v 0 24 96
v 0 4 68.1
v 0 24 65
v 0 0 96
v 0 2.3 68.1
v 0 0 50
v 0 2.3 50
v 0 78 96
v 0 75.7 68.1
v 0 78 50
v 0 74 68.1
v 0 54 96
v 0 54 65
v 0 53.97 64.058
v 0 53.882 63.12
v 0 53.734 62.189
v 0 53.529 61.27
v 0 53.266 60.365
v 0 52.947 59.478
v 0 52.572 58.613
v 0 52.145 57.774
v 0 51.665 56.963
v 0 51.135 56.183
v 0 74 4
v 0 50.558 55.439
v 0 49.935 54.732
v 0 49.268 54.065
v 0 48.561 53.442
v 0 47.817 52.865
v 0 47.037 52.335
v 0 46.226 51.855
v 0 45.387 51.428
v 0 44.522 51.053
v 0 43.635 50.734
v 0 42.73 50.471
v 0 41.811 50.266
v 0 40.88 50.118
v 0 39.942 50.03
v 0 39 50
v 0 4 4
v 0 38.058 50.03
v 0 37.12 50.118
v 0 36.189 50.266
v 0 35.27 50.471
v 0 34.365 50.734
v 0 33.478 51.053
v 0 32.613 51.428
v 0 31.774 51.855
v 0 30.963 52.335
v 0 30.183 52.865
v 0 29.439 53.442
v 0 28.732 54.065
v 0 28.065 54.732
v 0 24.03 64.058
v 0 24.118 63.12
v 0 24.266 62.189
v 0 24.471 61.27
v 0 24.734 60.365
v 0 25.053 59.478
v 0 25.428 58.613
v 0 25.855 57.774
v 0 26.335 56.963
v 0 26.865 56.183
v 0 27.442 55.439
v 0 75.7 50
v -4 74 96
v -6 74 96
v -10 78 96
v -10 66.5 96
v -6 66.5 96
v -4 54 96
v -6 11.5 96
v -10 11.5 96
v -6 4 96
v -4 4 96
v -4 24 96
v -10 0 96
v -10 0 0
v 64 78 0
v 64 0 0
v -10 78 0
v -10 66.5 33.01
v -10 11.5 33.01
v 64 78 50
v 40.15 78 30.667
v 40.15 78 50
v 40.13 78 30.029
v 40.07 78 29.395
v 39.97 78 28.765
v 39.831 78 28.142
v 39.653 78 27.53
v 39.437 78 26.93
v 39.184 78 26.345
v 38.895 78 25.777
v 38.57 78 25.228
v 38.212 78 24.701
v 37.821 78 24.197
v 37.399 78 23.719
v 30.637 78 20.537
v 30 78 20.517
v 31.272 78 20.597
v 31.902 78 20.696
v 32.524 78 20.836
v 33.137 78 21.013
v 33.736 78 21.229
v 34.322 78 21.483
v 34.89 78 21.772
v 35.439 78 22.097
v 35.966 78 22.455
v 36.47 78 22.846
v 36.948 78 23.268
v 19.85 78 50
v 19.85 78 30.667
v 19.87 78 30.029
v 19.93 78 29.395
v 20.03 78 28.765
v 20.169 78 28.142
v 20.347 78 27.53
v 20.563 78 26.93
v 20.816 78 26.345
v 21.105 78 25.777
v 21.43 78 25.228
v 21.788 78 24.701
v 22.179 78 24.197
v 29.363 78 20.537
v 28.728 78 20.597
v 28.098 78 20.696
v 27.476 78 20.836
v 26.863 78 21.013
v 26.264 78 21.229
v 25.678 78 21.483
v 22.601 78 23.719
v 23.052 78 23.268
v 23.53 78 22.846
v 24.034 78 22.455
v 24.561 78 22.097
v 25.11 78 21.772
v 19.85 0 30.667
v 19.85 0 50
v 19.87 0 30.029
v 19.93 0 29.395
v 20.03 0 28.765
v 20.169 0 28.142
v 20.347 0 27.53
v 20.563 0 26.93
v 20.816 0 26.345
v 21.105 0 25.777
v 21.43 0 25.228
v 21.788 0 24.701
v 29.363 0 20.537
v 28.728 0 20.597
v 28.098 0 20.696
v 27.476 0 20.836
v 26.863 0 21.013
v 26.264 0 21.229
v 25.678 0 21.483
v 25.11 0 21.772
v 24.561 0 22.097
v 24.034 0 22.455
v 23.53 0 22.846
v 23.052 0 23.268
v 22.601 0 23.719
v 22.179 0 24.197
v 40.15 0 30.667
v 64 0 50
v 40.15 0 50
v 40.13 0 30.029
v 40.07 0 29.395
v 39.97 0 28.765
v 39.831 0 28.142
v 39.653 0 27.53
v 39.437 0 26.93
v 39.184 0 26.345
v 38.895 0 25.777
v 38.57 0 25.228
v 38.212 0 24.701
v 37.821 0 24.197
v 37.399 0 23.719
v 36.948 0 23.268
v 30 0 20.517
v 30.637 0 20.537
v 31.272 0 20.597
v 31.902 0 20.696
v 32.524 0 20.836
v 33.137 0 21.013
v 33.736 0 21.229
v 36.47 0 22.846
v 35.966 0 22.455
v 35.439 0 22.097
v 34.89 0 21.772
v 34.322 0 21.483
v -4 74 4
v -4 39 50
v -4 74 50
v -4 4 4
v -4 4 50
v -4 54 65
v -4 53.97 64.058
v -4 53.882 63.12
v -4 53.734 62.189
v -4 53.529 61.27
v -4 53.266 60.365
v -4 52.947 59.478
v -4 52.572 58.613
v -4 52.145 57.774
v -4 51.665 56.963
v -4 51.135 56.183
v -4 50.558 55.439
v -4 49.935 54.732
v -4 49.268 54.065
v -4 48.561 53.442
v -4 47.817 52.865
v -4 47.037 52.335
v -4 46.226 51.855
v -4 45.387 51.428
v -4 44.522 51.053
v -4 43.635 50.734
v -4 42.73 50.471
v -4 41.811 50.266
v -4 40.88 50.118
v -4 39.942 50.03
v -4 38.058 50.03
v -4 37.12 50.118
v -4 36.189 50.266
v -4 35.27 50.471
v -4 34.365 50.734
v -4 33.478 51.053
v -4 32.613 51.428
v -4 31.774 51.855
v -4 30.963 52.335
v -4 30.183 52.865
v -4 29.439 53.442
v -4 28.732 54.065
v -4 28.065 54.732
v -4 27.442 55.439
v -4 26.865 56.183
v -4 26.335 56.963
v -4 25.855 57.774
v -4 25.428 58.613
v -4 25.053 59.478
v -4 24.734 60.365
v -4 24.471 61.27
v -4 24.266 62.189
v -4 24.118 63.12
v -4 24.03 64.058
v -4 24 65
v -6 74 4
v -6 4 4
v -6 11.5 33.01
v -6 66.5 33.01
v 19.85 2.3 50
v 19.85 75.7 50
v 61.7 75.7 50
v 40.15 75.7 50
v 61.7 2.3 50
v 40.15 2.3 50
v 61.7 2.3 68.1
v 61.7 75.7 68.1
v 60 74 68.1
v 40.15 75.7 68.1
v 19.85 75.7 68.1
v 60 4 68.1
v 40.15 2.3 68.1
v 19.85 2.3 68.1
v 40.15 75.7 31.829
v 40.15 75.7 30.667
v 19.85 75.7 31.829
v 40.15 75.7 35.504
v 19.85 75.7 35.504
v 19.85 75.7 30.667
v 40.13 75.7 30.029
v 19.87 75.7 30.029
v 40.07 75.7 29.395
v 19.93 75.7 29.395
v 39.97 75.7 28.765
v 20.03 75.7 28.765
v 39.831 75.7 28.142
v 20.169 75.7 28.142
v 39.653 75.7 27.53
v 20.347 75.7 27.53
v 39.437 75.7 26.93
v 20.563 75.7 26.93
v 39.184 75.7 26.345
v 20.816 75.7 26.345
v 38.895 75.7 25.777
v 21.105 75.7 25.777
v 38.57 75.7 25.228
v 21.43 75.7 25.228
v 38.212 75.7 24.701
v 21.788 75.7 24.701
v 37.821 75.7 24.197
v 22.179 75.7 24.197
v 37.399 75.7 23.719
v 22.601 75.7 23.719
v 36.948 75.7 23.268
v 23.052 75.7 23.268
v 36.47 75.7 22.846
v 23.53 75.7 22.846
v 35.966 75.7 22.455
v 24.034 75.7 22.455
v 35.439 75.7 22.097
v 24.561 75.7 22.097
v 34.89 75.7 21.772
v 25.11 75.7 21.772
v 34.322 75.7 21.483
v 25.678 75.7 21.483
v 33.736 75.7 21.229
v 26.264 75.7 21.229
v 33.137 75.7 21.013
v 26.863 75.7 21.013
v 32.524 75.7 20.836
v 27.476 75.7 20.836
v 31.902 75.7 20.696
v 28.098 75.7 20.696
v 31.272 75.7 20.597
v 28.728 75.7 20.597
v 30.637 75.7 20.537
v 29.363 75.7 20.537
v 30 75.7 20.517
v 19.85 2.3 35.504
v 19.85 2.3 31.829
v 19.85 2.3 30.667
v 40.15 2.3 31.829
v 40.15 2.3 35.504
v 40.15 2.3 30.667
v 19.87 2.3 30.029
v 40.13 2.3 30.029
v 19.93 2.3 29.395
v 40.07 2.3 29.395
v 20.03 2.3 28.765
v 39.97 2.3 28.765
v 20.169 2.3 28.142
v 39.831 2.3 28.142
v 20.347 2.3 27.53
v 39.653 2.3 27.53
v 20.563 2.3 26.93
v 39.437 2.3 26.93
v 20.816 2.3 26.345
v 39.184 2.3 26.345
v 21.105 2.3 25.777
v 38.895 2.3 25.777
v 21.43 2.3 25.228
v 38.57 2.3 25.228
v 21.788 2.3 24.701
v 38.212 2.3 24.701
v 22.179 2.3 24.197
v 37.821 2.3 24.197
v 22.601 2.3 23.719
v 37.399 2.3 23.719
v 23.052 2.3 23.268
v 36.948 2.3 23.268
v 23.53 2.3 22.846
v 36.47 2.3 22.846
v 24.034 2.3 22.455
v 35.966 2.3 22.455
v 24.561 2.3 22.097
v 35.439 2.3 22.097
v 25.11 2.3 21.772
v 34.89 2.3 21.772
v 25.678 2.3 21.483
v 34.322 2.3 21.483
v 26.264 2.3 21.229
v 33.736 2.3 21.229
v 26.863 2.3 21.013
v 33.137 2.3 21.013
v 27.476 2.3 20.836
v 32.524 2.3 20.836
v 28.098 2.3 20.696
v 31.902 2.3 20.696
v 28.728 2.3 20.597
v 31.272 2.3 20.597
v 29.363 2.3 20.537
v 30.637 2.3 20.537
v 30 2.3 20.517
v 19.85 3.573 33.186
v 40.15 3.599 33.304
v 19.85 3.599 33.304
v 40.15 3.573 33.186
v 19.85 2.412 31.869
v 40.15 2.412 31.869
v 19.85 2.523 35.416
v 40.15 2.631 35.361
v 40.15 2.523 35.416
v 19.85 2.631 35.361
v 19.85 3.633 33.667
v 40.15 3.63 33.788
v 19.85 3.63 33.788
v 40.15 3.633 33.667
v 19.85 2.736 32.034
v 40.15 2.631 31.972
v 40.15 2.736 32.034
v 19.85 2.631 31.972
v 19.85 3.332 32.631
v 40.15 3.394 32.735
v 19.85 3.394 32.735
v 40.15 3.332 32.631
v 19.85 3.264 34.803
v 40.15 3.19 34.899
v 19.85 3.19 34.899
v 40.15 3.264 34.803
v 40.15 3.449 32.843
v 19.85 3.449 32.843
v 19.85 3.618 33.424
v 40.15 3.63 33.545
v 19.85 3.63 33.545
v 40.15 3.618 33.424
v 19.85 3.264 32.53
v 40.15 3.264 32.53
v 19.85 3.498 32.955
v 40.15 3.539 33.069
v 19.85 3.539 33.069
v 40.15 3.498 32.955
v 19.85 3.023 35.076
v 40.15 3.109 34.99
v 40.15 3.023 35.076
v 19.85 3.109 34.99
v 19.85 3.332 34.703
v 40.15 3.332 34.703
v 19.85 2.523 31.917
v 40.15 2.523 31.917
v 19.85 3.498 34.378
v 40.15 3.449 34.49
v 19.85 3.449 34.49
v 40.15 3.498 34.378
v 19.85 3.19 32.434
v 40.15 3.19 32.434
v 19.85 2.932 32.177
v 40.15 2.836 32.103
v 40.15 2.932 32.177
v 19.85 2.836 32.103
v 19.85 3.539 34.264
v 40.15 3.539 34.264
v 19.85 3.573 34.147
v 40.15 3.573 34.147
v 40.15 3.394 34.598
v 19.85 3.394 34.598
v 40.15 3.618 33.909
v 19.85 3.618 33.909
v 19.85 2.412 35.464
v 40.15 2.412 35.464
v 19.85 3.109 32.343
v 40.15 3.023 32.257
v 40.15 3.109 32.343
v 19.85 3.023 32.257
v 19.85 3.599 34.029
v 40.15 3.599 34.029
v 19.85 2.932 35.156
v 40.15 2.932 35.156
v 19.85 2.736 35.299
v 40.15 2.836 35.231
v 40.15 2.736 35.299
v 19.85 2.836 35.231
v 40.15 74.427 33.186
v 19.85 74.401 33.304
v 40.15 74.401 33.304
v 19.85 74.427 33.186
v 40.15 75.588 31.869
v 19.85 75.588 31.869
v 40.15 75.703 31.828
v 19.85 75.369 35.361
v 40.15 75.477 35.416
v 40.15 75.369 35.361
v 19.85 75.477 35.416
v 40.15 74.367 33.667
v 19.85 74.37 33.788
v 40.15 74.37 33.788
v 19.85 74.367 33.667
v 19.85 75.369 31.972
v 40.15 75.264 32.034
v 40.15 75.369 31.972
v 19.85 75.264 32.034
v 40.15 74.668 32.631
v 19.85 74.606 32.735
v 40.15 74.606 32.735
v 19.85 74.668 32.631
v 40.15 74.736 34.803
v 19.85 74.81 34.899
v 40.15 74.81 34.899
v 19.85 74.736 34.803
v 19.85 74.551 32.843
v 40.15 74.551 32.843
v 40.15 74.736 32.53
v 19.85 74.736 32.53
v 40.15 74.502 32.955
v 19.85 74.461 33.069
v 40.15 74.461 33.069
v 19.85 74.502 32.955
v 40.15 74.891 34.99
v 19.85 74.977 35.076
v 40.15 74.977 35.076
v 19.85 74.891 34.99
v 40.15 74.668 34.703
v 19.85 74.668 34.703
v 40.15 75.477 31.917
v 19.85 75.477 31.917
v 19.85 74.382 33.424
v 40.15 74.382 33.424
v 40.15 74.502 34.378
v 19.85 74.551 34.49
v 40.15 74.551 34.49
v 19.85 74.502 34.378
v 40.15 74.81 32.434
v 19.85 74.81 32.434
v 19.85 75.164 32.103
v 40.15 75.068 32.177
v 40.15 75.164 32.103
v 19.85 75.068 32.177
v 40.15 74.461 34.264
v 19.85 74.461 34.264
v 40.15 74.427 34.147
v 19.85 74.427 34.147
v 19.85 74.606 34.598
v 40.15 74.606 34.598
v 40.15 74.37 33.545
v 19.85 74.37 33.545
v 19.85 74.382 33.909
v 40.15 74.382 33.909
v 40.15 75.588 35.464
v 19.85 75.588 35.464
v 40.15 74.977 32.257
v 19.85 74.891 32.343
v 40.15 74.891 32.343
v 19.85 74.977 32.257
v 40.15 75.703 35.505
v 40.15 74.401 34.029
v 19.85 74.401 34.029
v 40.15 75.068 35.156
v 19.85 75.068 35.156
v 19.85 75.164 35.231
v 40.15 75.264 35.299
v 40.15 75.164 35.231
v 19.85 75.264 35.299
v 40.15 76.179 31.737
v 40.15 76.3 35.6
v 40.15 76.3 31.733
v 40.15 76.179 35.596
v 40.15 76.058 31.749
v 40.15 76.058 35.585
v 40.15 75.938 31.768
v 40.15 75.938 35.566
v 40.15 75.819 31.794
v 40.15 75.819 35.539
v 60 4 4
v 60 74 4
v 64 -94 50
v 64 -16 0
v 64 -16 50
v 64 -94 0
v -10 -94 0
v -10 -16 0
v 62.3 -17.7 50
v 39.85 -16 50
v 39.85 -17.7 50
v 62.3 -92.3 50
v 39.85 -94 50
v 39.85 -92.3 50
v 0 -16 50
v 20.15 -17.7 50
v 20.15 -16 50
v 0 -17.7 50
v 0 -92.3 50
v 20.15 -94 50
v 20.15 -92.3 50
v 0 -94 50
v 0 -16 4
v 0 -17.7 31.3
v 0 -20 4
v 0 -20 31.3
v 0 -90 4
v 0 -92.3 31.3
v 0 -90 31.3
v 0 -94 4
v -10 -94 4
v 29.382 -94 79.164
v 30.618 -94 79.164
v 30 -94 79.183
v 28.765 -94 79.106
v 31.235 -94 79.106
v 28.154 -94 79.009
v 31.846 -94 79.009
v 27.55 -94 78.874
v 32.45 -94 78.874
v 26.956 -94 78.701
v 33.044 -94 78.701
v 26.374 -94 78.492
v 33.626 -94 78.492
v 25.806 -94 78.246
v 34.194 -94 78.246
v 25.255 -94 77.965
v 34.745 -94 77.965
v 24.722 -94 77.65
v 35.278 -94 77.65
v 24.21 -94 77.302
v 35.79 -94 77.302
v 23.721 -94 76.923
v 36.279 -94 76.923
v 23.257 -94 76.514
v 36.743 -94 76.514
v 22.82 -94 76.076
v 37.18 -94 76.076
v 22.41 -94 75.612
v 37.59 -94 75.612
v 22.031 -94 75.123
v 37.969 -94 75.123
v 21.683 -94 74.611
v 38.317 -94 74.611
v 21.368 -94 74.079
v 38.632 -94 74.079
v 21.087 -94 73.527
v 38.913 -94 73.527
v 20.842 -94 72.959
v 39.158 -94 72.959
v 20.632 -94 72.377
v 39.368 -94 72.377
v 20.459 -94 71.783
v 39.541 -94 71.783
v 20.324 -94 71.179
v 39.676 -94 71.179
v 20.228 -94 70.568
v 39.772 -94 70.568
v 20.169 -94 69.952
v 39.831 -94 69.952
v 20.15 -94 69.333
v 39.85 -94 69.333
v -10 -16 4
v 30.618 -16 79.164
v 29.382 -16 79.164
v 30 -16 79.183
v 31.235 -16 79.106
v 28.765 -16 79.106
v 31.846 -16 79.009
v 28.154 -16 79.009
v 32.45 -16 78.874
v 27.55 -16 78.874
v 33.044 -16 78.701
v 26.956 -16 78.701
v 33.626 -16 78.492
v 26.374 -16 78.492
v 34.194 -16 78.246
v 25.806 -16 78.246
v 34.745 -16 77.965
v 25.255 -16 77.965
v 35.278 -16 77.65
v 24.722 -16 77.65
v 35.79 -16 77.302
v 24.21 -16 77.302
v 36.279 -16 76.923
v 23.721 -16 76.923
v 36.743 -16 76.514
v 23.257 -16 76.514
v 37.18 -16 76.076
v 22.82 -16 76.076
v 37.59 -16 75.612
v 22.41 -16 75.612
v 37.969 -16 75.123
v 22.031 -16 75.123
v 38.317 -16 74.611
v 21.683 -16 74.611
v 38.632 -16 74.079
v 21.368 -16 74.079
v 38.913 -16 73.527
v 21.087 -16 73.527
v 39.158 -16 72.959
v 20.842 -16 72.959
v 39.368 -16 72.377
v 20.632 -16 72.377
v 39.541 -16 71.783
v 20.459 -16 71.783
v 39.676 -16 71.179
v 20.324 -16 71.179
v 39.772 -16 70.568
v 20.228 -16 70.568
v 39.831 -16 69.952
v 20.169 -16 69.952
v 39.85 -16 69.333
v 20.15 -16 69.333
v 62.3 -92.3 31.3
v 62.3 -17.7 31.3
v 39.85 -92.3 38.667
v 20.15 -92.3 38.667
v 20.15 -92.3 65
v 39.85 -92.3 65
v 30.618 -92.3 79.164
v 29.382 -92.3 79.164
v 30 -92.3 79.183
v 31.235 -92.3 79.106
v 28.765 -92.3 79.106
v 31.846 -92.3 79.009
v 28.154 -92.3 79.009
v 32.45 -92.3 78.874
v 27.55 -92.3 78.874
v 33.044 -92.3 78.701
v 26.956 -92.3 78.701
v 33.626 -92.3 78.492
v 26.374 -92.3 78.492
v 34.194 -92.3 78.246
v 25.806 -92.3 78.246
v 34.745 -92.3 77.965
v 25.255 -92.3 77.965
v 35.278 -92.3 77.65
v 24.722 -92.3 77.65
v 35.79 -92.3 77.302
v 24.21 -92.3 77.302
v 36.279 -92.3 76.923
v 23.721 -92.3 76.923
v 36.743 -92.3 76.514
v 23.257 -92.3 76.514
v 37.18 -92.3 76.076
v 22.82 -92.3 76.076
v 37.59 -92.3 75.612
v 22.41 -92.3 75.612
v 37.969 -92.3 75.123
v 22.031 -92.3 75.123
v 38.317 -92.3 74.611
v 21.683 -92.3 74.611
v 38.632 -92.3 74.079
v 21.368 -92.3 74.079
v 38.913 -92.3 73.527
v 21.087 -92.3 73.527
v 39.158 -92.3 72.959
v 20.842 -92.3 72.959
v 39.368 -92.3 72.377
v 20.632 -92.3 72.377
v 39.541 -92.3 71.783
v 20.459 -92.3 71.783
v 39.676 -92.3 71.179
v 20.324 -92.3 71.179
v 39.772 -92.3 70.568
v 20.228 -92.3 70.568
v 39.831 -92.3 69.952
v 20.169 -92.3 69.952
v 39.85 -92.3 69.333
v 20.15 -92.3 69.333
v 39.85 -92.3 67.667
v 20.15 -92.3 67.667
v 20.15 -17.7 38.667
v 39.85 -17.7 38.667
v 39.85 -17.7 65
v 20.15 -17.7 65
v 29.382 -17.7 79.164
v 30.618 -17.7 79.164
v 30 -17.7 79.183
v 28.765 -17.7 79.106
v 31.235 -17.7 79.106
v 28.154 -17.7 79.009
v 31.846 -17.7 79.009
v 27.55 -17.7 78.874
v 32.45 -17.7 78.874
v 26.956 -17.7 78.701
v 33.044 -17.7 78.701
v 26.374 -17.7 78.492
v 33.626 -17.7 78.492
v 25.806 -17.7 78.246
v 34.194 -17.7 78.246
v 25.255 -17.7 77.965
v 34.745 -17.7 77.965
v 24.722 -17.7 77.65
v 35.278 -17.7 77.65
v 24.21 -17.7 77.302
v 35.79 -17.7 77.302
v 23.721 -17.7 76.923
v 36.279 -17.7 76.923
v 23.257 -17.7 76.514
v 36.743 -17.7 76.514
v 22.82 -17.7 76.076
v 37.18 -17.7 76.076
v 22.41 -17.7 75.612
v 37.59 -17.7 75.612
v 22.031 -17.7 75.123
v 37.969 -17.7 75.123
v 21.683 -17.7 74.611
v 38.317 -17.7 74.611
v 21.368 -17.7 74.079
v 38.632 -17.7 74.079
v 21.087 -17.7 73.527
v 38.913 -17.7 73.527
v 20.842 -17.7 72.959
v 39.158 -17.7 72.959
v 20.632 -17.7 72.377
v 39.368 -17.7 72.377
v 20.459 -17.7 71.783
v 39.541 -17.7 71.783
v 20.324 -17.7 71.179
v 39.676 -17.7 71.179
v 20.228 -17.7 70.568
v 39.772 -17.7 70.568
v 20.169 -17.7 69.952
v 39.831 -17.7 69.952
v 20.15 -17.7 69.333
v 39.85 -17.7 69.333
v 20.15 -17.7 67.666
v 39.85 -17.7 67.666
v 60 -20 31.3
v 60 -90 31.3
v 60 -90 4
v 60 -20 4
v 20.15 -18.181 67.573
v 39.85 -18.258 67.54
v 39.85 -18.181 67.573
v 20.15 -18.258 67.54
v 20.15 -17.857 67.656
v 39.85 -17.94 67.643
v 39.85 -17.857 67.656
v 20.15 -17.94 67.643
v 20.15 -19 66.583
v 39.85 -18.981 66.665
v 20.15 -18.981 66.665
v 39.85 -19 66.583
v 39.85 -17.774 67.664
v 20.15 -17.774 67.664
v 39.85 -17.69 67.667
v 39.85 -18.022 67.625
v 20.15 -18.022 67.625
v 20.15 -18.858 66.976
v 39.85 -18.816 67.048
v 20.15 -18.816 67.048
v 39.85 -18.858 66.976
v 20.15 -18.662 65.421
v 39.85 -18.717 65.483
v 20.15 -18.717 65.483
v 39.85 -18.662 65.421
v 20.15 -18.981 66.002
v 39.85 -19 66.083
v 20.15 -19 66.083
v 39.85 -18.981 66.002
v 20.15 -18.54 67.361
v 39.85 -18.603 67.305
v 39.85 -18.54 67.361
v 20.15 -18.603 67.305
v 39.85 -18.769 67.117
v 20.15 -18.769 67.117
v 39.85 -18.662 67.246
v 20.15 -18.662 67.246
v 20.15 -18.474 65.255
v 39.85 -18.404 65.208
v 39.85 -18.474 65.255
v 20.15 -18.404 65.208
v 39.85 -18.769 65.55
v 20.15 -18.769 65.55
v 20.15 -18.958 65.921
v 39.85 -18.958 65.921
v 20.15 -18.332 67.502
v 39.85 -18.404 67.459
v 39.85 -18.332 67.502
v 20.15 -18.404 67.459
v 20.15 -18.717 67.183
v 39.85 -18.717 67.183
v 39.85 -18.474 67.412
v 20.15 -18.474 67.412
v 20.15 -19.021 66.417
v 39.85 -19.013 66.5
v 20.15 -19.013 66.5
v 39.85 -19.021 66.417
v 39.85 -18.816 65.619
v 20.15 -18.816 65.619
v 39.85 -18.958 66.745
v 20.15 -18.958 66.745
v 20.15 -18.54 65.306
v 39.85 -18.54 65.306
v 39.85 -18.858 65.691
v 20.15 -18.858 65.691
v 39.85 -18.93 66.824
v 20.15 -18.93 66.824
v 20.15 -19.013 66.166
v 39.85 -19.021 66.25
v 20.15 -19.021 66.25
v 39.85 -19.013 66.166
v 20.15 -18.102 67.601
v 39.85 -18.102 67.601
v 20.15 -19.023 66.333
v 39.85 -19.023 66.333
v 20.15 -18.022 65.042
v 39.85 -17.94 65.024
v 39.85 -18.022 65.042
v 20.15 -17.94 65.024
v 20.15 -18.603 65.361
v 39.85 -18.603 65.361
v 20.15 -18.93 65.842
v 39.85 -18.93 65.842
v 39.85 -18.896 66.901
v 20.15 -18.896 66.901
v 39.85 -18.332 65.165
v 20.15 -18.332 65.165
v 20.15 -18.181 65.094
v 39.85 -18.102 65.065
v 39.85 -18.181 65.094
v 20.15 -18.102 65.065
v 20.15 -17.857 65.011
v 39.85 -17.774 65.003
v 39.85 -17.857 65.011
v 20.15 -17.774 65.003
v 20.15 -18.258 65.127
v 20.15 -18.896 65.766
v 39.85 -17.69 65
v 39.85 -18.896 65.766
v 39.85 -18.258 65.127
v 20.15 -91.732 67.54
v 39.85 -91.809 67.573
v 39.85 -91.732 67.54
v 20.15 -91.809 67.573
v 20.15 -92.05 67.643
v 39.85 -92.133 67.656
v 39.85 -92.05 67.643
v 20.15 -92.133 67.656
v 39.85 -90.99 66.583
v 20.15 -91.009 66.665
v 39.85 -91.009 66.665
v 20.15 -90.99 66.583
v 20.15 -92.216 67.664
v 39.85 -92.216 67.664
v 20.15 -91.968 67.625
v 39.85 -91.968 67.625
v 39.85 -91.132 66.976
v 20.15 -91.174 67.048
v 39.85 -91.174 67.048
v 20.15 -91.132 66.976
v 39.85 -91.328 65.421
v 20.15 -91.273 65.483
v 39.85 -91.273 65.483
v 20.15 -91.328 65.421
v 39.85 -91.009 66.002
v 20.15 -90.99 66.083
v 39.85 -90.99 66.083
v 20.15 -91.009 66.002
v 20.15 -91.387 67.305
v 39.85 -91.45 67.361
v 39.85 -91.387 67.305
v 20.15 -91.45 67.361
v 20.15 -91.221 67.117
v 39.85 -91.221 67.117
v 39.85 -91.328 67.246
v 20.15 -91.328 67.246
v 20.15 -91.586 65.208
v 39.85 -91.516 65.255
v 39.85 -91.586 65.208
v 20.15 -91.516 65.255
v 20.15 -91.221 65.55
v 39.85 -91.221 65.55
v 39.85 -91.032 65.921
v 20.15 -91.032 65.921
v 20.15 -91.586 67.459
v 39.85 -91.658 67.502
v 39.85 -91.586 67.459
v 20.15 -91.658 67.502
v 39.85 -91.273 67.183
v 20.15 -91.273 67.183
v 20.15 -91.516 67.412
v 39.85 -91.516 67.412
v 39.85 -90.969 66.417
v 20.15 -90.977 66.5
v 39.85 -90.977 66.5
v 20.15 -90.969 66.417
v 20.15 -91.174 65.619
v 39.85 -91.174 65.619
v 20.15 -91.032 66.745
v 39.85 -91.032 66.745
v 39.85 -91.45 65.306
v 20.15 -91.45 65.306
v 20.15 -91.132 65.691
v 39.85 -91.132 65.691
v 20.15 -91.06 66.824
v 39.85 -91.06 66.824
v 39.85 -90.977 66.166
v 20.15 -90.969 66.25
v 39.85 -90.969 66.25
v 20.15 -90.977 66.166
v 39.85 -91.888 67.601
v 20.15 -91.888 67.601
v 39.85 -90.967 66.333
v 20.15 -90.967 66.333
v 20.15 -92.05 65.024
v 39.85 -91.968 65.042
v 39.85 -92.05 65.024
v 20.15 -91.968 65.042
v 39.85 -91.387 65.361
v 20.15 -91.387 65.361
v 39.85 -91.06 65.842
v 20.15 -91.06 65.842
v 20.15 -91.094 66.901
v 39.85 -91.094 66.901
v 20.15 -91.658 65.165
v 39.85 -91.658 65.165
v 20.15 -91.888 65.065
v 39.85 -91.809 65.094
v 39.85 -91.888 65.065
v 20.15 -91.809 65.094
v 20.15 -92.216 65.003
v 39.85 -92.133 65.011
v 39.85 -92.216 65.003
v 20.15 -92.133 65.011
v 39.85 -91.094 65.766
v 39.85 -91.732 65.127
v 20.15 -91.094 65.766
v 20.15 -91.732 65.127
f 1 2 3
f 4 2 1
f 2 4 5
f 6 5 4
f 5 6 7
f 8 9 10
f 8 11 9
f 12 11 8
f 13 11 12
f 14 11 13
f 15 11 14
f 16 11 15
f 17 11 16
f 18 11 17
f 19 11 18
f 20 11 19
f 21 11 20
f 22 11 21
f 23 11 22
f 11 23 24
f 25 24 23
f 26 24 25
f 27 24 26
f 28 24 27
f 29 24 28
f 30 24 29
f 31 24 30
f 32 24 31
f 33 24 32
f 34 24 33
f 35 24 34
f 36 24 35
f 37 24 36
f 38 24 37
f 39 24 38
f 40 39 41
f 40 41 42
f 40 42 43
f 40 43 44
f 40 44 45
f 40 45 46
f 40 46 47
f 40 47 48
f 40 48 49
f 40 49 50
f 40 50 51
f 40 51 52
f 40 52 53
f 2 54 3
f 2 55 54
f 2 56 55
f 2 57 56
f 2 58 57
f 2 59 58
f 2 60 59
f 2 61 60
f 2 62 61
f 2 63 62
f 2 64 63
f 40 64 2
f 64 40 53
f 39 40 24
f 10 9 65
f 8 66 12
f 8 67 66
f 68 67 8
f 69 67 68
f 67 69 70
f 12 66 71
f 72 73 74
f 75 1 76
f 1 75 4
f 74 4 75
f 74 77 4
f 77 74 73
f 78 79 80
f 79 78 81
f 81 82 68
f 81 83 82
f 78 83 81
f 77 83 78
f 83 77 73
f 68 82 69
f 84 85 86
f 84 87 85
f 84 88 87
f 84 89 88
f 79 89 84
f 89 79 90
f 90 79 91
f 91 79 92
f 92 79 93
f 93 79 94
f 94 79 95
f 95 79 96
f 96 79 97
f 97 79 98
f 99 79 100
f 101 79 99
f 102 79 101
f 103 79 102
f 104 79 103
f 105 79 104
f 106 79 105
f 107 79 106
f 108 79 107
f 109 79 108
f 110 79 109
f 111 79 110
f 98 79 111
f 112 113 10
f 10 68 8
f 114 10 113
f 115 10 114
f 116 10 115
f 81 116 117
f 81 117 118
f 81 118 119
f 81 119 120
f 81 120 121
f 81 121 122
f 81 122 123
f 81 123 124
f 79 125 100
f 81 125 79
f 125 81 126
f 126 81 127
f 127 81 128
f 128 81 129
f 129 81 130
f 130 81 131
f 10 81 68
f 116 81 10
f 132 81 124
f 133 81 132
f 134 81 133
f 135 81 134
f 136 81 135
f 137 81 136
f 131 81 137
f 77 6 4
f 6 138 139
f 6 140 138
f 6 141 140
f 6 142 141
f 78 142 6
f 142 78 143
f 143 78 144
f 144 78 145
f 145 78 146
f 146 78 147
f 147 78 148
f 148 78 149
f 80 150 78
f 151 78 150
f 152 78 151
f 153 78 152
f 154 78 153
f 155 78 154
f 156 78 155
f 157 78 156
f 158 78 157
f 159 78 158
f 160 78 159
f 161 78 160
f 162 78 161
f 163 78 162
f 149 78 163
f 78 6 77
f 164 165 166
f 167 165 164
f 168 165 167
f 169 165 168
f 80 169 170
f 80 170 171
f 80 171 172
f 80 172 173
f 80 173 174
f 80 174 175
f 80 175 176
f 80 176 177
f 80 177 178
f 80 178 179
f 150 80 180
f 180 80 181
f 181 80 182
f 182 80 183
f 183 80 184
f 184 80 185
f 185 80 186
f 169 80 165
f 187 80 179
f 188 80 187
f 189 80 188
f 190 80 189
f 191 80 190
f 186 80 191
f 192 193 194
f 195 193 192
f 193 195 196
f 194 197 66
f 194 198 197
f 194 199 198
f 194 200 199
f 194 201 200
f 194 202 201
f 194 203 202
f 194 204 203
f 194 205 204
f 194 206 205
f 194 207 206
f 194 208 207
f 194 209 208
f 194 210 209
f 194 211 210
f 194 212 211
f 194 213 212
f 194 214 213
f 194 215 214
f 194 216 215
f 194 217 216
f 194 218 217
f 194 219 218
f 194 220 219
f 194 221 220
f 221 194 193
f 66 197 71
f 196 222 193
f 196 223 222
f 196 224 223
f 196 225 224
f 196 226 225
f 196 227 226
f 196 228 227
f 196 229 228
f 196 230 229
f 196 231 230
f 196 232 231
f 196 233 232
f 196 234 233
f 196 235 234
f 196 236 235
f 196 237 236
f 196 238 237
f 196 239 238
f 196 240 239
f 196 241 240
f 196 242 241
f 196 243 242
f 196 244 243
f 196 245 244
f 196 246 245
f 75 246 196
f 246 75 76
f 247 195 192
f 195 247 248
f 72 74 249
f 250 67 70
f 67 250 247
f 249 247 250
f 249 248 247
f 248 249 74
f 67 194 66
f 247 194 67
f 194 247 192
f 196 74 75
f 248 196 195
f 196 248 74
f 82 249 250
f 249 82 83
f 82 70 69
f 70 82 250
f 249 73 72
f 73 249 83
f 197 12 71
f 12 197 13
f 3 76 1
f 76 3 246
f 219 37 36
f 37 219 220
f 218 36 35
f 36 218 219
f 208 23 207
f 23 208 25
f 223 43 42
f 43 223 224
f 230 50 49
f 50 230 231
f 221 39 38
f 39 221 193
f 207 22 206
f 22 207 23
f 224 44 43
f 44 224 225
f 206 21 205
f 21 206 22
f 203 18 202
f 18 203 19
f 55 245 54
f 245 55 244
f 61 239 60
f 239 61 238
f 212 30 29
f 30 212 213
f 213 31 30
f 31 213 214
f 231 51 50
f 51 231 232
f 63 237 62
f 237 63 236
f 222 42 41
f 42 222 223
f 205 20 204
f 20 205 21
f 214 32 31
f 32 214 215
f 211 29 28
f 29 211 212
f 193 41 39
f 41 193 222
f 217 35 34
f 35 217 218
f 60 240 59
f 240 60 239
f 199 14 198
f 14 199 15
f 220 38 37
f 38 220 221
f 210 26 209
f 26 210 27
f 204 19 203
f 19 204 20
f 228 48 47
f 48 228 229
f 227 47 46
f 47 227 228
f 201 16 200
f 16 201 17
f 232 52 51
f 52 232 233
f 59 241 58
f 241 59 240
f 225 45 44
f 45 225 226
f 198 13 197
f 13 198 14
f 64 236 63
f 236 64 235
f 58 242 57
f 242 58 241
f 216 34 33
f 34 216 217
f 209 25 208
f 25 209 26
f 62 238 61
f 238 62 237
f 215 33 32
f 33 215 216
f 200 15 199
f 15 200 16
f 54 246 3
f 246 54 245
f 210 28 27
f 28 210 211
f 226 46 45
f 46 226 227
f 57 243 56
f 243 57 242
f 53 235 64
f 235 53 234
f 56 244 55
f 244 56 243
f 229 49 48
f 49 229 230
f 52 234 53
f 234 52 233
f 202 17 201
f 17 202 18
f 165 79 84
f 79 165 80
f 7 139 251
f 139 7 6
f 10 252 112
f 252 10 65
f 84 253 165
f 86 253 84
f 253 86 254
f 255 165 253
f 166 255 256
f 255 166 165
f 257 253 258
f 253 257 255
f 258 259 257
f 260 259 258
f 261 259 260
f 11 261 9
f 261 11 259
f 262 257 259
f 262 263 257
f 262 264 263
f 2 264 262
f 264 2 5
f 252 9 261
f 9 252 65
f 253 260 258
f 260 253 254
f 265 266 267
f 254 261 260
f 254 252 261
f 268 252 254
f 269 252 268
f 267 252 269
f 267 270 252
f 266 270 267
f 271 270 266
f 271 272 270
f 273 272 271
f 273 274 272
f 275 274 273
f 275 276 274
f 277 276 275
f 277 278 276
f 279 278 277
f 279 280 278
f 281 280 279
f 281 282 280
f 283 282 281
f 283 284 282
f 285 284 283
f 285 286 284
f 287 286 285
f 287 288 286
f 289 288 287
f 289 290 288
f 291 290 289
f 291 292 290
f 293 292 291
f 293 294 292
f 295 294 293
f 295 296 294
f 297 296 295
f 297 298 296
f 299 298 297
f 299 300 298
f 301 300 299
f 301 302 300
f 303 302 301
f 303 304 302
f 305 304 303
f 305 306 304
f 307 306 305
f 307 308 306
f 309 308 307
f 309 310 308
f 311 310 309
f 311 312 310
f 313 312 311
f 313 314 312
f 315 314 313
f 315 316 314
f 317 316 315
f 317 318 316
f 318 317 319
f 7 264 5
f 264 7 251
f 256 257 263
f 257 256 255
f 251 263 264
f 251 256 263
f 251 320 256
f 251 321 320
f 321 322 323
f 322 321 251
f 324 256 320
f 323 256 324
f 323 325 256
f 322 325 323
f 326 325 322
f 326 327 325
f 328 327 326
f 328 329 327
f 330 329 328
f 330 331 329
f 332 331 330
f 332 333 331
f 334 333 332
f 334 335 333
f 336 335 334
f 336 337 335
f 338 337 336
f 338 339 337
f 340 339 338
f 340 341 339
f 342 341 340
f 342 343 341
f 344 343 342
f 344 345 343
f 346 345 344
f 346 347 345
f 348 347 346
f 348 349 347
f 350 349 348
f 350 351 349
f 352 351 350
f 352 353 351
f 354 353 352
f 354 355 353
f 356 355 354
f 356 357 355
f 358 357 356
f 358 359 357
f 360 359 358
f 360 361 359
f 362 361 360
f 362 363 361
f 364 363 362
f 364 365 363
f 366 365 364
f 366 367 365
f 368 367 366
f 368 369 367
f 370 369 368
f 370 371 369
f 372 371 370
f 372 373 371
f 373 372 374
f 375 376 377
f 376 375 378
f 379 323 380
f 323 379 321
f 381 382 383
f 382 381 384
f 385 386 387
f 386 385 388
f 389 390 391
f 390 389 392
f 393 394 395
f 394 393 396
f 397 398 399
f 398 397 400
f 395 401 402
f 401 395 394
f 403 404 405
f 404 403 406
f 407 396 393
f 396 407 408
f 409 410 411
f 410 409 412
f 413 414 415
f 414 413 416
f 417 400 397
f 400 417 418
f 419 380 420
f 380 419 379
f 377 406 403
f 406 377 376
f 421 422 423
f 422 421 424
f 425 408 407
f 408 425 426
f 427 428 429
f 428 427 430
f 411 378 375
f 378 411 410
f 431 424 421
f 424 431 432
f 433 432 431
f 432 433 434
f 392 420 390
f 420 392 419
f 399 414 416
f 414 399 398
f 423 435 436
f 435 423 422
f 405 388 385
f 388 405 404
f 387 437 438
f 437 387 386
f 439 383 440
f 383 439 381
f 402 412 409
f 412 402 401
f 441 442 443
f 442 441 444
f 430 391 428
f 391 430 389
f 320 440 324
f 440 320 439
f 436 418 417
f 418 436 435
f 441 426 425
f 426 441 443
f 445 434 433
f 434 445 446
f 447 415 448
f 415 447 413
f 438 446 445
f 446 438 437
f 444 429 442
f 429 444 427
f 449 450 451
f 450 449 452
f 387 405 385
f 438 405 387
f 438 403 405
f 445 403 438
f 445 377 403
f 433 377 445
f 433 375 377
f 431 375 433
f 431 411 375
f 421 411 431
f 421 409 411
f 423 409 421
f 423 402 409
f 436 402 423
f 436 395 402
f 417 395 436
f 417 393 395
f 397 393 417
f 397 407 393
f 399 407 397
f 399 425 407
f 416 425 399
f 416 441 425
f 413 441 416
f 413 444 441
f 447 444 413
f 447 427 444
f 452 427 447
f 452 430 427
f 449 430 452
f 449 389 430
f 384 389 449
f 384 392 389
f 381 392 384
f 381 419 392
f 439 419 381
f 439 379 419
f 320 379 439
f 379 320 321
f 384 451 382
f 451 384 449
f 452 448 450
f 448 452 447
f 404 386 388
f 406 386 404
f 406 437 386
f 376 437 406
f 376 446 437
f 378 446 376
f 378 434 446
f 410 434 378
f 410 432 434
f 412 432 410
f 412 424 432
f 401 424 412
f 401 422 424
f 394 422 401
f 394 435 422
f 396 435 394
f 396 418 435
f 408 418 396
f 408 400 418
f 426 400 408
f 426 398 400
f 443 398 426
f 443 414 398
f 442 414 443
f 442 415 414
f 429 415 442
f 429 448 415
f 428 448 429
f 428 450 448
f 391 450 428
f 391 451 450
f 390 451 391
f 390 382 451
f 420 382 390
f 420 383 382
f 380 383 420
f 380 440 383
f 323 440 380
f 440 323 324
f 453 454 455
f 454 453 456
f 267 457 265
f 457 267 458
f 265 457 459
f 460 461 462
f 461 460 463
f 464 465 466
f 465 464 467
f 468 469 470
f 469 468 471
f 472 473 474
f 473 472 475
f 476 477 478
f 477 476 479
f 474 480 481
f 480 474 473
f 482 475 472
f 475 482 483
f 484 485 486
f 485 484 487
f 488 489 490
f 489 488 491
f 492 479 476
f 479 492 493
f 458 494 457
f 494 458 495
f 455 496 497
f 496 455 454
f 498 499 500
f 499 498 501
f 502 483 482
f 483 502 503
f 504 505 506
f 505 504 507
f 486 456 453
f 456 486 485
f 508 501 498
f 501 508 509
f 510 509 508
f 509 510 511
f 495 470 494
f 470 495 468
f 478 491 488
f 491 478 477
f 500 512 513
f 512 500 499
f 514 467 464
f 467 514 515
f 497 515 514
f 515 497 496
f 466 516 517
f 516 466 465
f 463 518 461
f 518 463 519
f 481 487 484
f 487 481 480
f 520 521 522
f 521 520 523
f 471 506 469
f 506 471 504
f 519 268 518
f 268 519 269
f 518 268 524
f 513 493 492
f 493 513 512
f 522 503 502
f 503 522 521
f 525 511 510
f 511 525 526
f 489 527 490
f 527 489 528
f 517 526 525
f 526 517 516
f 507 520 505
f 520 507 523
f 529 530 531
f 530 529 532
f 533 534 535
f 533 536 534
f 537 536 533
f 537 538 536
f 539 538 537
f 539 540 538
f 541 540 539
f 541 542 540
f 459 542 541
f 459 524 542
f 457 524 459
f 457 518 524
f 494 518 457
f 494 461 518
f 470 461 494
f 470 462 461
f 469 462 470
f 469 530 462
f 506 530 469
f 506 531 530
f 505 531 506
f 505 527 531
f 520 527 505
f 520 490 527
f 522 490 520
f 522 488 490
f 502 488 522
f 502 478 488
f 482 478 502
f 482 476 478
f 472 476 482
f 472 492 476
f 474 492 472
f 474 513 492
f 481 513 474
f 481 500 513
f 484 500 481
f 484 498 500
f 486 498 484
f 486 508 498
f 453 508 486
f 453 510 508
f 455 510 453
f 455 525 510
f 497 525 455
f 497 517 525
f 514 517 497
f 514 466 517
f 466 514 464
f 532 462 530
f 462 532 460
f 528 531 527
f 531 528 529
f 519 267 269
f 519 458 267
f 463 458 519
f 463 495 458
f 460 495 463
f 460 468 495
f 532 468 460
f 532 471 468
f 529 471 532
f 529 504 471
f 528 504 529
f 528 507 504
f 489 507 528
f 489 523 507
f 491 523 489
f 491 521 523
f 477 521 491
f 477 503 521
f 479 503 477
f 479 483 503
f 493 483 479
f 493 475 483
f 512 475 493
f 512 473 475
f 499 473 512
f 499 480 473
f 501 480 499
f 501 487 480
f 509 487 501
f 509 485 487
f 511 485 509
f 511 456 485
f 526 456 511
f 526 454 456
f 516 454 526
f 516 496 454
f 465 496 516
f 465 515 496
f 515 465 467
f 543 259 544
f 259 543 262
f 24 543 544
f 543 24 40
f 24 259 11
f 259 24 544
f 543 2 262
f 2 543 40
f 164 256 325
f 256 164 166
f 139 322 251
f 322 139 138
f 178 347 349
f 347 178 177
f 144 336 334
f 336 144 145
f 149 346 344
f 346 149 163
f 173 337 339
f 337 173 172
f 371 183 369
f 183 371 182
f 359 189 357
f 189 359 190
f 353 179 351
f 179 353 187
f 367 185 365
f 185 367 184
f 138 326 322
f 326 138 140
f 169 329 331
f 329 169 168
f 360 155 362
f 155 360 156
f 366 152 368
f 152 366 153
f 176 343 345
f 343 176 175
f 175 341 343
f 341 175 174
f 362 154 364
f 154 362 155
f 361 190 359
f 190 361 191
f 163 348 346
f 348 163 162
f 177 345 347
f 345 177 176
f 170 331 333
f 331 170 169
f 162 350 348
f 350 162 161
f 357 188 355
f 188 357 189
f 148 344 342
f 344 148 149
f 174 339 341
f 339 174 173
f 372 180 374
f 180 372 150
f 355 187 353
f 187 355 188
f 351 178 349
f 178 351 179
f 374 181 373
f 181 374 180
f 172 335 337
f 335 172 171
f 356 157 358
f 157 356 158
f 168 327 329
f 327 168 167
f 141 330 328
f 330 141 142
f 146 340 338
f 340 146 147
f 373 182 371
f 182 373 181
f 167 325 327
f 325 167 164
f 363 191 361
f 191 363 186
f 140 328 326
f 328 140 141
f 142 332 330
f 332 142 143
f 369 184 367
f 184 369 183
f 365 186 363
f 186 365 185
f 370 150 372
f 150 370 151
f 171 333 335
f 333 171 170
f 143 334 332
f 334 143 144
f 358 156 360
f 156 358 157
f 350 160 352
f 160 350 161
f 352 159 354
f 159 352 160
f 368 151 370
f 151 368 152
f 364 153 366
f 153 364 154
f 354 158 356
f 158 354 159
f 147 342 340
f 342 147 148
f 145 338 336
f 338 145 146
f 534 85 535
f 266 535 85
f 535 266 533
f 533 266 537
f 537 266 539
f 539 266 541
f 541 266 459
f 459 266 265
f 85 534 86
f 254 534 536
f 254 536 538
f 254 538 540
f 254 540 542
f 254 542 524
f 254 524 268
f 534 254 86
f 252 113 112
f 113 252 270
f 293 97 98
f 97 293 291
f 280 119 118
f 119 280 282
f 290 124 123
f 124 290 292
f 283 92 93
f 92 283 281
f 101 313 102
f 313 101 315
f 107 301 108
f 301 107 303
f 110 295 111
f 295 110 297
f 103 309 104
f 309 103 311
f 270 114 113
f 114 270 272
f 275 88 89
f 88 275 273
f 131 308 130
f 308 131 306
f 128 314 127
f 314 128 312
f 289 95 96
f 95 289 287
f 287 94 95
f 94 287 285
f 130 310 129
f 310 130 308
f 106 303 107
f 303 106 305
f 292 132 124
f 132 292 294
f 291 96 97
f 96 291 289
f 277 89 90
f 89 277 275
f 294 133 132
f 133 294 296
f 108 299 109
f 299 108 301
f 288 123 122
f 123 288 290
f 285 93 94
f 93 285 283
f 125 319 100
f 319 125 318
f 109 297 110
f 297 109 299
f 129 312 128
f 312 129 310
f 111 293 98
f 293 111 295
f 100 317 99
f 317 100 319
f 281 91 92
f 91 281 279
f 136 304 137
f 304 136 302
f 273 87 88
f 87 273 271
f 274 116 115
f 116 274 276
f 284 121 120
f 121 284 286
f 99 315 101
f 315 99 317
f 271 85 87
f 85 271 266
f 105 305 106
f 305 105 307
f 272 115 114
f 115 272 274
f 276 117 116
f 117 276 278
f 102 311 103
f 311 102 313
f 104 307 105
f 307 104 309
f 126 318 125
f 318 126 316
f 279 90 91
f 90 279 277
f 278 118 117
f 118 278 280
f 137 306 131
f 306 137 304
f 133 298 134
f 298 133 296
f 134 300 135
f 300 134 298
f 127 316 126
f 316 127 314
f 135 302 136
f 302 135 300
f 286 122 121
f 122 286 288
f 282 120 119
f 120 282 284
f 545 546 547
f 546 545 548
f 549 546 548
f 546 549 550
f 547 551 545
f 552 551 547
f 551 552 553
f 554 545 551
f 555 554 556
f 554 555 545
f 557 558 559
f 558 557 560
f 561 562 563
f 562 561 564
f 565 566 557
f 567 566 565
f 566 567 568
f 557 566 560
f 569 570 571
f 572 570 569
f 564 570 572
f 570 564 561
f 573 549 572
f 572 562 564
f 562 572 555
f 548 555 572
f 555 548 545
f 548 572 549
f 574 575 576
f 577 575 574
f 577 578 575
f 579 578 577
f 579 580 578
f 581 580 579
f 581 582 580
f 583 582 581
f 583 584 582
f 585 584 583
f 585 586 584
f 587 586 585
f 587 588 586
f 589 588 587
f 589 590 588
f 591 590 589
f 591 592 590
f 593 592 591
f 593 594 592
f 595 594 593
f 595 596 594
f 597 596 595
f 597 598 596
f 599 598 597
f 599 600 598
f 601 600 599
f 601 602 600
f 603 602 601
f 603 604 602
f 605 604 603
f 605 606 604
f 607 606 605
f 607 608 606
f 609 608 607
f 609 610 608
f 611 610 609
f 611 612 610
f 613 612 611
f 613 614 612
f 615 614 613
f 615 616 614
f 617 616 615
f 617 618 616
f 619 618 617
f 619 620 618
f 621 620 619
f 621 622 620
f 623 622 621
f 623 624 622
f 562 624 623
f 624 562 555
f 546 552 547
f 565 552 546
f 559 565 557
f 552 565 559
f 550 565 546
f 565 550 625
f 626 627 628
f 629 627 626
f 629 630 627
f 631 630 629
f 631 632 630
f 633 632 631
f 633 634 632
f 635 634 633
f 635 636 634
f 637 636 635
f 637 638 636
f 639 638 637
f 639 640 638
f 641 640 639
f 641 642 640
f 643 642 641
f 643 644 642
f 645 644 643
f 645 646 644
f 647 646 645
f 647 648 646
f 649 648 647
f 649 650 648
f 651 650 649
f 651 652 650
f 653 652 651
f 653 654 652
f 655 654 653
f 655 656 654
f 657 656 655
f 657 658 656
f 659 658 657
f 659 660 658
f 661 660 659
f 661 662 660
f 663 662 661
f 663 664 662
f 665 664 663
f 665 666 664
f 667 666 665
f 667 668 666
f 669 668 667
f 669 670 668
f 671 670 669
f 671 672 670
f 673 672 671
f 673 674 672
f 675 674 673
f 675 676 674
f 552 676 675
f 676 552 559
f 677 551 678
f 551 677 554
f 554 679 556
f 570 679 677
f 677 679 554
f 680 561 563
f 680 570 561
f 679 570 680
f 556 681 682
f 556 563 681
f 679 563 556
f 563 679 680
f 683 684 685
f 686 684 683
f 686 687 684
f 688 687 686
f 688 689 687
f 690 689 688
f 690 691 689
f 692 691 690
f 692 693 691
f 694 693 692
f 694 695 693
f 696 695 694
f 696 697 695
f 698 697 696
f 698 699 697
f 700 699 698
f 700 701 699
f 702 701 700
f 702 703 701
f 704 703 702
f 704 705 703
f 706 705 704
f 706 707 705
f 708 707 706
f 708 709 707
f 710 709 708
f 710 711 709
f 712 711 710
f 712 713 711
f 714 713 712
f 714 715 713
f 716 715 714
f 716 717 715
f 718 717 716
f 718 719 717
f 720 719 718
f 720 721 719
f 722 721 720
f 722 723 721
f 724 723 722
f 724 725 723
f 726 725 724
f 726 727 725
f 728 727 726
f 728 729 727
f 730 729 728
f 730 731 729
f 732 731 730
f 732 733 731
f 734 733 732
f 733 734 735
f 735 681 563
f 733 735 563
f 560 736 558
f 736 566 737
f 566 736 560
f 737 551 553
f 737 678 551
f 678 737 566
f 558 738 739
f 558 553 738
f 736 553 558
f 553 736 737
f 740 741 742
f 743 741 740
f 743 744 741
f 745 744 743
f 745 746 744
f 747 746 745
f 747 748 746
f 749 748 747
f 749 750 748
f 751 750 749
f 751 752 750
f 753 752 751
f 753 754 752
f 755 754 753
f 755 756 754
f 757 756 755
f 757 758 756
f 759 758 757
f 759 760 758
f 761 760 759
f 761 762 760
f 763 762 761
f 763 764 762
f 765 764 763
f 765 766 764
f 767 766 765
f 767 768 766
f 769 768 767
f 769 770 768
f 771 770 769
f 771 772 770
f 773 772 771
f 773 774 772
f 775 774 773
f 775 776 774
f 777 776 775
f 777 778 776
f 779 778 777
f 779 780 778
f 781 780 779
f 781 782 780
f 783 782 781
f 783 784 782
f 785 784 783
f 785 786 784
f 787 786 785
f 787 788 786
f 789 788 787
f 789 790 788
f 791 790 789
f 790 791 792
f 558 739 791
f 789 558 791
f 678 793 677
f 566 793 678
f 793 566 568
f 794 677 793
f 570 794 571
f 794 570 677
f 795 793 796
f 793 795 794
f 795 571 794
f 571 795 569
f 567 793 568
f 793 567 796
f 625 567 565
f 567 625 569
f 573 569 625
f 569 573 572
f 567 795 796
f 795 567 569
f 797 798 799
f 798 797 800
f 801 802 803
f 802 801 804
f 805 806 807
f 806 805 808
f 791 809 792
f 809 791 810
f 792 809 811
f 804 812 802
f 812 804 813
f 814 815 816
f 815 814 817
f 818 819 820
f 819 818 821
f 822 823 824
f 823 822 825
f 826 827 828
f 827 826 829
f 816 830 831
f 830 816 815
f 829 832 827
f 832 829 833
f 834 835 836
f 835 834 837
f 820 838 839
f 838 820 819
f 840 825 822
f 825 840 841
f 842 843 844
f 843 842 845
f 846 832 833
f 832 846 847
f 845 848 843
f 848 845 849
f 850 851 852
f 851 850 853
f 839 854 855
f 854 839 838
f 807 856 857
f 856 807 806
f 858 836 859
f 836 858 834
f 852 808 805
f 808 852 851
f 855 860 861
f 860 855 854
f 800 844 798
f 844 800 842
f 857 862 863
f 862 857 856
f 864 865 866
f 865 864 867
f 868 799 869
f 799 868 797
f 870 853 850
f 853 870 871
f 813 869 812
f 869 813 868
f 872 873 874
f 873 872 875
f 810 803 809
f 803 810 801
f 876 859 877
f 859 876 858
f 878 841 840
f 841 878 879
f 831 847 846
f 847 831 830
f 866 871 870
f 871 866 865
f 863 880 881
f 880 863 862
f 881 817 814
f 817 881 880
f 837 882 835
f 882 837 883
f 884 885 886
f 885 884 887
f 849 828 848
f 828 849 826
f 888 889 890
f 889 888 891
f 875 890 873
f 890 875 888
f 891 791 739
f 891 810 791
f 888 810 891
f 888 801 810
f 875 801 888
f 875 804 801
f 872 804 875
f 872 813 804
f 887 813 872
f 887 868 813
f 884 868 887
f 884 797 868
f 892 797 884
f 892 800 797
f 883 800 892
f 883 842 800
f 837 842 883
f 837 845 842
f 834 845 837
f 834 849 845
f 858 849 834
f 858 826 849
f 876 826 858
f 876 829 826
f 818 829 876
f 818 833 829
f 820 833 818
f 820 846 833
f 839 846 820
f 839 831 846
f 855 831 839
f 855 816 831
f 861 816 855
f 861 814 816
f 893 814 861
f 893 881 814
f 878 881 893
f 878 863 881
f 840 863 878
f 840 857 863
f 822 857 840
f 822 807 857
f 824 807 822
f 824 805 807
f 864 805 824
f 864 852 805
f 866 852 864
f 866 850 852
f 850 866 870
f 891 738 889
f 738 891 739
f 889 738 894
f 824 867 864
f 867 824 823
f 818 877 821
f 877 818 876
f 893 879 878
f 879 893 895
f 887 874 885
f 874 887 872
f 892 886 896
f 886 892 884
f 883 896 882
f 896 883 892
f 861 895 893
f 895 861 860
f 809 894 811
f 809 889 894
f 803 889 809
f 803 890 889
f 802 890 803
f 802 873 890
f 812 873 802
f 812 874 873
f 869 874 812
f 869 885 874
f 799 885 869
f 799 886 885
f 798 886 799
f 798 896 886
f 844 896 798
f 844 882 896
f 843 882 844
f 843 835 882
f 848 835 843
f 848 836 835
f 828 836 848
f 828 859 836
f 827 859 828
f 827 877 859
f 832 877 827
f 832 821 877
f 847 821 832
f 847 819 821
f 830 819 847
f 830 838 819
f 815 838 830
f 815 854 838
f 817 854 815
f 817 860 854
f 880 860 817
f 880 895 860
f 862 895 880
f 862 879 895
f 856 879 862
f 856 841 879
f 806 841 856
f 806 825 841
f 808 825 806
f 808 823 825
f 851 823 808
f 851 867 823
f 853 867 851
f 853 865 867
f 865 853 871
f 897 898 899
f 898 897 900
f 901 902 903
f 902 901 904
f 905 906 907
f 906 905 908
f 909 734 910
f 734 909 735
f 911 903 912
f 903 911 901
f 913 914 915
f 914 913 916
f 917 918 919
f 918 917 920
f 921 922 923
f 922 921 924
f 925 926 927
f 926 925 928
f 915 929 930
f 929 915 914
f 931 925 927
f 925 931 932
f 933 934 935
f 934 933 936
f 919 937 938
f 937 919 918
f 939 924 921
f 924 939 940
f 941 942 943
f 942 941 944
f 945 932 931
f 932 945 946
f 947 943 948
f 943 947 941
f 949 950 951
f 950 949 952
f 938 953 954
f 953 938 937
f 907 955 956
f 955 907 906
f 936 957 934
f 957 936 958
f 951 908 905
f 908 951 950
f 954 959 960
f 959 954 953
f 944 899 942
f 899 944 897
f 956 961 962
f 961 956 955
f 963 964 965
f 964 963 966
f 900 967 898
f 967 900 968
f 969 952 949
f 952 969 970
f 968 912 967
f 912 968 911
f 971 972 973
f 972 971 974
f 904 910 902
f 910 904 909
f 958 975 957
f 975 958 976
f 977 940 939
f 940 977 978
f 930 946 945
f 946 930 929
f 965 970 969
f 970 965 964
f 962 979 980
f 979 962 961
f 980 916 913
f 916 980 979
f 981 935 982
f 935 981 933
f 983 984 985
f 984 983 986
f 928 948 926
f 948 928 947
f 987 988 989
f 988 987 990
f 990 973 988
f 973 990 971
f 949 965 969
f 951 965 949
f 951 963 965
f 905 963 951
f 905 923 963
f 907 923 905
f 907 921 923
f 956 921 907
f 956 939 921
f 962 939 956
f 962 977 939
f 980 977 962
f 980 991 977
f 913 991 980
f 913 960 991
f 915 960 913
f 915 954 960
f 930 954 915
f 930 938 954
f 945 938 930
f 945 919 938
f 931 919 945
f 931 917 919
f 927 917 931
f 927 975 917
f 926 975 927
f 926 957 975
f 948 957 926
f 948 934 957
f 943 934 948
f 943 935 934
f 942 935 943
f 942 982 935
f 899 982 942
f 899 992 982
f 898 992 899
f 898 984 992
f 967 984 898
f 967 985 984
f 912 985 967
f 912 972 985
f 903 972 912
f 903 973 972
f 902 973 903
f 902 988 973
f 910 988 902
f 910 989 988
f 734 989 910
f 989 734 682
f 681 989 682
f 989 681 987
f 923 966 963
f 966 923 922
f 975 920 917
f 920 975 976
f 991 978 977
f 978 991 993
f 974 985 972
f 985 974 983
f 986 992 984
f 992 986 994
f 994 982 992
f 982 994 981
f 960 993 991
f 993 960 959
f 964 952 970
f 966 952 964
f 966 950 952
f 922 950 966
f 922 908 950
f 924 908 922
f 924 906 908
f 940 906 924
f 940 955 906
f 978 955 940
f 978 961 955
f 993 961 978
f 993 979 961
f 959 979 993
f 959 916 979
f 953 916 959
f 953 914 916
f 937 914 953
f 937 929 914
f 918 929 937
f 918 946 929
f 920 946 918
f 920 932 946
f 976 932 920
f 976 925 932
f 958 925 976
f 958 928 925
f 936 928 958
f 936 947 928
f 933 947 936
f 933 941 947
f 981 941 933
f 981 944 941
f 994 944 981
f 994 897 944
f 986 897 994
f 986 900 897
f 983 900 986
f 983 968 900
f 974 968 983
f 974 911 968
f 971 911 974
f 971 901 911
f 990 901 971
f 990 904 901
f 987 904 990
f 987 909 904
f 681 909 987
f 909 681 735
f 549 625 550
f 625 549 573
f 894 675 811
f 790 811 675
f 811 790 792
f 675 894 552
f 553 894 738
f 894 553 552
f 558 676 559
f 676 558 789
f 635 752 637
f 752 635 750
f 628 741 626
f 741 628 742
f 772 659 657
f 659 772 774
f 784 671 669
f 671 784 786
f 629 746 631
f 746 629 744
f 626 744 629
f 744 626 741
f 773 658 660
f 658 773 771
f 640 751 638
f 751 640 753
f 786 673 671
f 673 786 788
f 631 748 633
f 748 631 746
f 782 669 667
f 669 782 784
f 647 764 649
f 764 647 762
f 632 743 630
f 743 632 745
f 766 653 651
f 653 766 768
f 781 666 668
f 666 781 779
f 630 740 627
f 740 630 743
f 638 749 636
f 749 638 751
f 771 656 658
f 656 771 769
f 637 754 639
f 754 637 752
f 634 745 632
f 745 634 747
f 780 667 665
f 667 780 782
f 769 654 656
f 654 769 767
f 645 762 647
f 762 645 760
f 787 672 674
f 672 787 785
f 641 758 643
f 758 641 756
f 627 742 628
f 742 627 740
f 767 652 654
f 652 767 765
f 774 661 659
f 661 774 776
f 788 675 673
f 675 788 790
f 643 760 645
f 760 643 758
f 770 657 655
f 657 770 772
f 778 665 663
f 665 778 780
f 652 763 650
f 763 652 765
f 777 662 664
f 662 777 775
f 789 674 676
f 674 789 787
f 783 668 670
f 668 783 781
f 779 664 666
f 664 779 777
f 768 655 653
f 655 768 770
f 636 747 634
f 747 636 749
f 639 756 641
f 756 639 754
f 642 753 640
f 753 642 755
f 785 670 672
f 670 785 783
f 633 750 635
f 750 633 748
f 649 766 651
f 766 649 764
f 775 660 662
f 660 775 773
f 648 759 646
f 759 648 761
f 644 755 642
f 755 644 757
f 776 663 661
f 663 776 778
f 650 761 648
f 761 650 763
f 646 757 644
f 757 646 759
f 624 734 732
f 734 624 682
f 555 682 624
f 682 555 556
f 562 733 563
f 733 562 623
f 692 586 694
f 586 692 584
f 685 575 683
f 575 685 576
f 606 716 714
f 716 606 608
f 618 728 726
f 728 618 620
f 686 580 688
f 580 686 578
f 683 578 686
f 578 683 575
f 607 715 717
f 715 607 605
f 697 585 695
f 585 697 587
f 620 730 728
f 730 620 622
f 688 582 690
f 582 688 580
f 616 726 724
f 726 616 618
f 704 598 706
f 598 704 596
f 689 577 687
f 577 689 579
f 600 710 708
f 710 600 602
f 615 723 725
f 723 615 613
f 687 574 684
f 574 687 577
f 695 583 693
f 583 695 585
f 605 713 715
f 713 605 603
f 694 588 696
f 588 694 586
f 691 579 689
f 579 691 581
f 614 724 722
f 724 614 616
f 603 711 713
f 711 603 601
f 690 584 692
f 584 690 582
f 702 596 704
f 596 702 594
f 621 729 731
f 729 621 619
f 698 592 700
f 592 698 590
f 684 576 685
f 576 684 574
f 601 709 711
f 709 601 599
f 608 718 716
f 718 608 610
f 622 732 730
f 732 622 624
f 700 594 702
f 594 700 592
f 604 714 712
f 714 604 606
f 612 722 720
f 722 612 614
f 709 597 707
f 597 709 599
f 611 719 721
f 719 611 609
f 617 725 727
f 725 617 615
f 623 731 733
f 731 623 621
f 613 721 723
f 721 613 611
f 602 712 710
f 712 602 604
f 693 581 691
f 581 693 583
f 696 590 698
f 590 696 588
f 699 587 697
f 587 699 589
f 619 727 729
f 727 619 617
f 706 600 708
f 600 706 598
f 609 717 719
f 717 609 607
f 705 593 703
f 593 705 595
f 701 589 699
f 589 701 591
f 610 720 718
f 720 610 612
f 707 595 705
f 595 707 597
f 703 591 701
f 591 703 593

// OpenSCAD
//parametrics:


//length of deck --> a deck of 100 unsleeved cards are ~32mm thick, 100 sleeved cards ~57mm thick
deckl = 60;	
//width of deck in mm --> ~66 for unsleeved cards, ~70 for sleeved 
deckw = 70;	
//height of deck --> ~89 unsleeved, ~92 sleeved
deckh = 92;	
//changes where lid meets box;should be a value between 0.3 and 0.8
lid_height = 0.5;   
deckh_lower = deckh*lid_height;	
deckh_upper = deckh*(1-deckh_lower/deckh);
//how thick the walls are in mm, probably stay above 3
wall = 4;			
//how much tolerance for the lid in mm
tolerance = 0.6;	
//commander stuff
commandl = 2;		
commandw = 70;
//this determines the entire height of deckbox, should be greater than or equal to "deckh"
commandh = 92;     
//window for commander artwork
windoww = 55;		
windowh = 63;
//changes size of grip, 0 for no grip space
gripw = 30;			
griph = deckh_lower+deckh*0.2+tolerance;
bump_radius = wall/3;



///This was made by David South (south2012)


module Commander ()
	{
     difference()
        {
            	cube([commandl+2*wall,commandw+2*wall,commandh+wall]);
            translate([wall,wall,wall])
            	cube([commandl,commandw,commandh+0.01]);
        		translate([-0.01,((commandw+2*wall)-windoww)/2,commandh-windowh+0.01+wall])
            	cube([wall+0.02,windoww,windowh]);
			
        }    
	}
    
module Deckbox ()
    {
    difference()
        {
			union()
			{
         	cube ([deckl+(wall*2),deckw+(wall*2),deckh_lower+wall]);
			translate([wall,0.5*wall+tolerance/2,deckh_lower+wall])
				cube([deckl+0.5*wall-tolerance/2,deckw+wall-tolerance,deckh*0.2-tolerance/2]);
			}
			translate([wall,wall,wall])
				cube ([deckl,deckw,deckh+0.01]);
			translate([deckl/3-tolerance/4+wall,0,deckh_lower-(deckh/6)])
				cube([deckl/3+0.5*tolerance,wall/2+0.5*tolerance,deckh_lower]);
			translate([deckl/2+wall,wall/2+0.5*tolerance,deckh_lower-(deckh/6)])
				rotate(90,[1,0,0])cylinder($fn=100,r=deckl/6+tolerance/4,h=0.5*wall+0.5*tolerance);
			translate([deckl/3-tolerance/4+wall,1.5*wall+deckw-tolerance/2,deckh_lower-(deckh/6)])
				cube([deckl/3+0.5*tolerance,wall/2+tolerance,deckh_lower]);
			translate([deckl/2+wall,2*wall+deckw,deckh_lower-(deckh/6)])
				rotate(90,[1,0,0])cylinder($fn=100,r=deckl/6+tolerance/4,h=0.5*wall+0.5*tolerance);
        
        translate([deckl/3+tolerance/4+wall-tolerance/2,wall/2-tolerance/2,deckh_lower-(deckh/6)+3])
            {
           intersection(){rotate(90,[0,1,0])cylinder($fn=100,r=bump_radius+tolerance,h=deckl/3+tolerance);
           translate([0,0,-bump_radius-tolerance])cube([deckl/3+tolerance/2,bump_radius+tolerance,2*bump_radius+2*tolerance]);}}
       
           rotate(180,[0,0,1])translate([-2/3*deckl-wall-tolerance/4,-1.5*wall-deckw-tolerance/2,deckh_lower-(deckh/6)+3])
            {
           intersection(){rotate(90,[0,1,0])cylinder($fn=100,r=bump_radius+tolerance,h=deckl/3+tolerance);
           translate([0,0,-bump_radius-tolerance])cube([deckl/3+tolerance/2,bump_radius+tolerance,2*bump_radius+2]);}}
   
       }
    }

module Lid ()
	{
	difference()
		{
		translate([0,0,deckh_lower])
			cube([deckl+wall,deckw+2*wall,deckh_upper+wall]);
		translate([0,0.5*wall-tolerance/2,deckh_lower])
			cube([deckl+0.5*wall+tolerance/2,deckw+wall+tolerance,deckh*deckh_upper]);
		}
        difference()
        {
        translate([0,0,deckh_lower+0.2*deckh+tolerance/2]) cube([deckl+wall,deckw+2*wall,-0.2*deckh+commandh]);
        translate([0,wall,deckh_lower+0.2*deckh+tolerance/2]) cube([deckl,deckw,0.5*deckh-0.2*deckh+wall+commandh-deckh]);
        translate([-0.01,-0.01,commandh]) cube([deckl+wall+0.02,deckw+2*wall+0.02,deckh]);
        }
	translate([0,0,deckh])
		cube([deckl+wall,deckw+2*wall,commandh-deckh+wall]);
	translate([-1*(wall*2+commandl),((0.5*(deckw+2*wall))-(0.5*(commandw+2*wall))),commandh])
		cube([commandl+2*wall,commandw+2*wall,wall]);
	translate([deckl/3+tolerance/4,0,deckh_lower-(deckh/6)-wall])
		cube([deckl/3-tolerance/2,wall/2-tolerance/2,deckh/3]);
	translate([deckl/2,wall/2-0.5*tolerance,deckh_lower-(deckh/6+wall)])
		rotate(90,[1,0,0])cylinder($fn=100,r=deckl/6-tolerance/4,h=0.5*wall-0.5*tolerance);
	translate([deckl/3+tolerance/4,deckw+1.5*wall+0.5*tolerance,deckh_lower-(deckh/6)-wall])
		cube([deckl/3-tolerance/2,wall/2-tolerance/2,deckh/3]);
	translate([deckl/2,deckw+1.5*wall+0.5*tolerance+wall/2-tolerance/2,deckh_lower-(deckh/6)-wall])
		rotate(90,[1,0,0])cylinder($fn=100,r=deckl/6-tolerance/4,h=0.5*wall-0.5*tolerance);
    translate([deckl/3+tolerance/4,wall/2-tolerance/2-0.01,deckh_lower-(deckh/6)+3-wall])
            {
           intersection(){rotate(90,[0,1,0])cylinder($fn=100,r=bump_radius,h=deckl/3);
           translate([0,0,-bump_radius])cube([deckl/3-tolerance/2,bump_radius,2*bump_radius]);}}
    translate([2*deckl/3-tolerance/4,2*wall+deckw-wall/2+tolerance/2,deckh_lower-(deckh/6)+3-wall])
            {
           rotate(180,[0,0,1]){intersection(){rotate(90,[0,1,0])cylinder($fn=100,r=bump_radius,h=deckl/3);
           translate([0,0,-bump_radius])cube([deckl/3-tolerance/2,bump_radius,2*bump_radius]);}}}
           
    
       }
	
	
//Commander stuff

	{
	difference()
	{	
	translate ([-1*(commandl+2*wall),((0.5*(deckw+2*wall))-(0.5*(commandw+2*wall))),0])
		Commander();
		translate([-wall,(2*wall+deckw)/2,griph+0.5*commandh])
				{
				cube([4*wall,gripw,commandh],center=true);
				}
		translate([-wall,(2*wall+deckw)/2,griph])
				{
				rotate(90,[0,1,0])cylinder($fn=100,r=gripw/2,h=4*wall+2,center=true);
				}

	}
	}	


//Actual deck

translate([-wall,0,0])
   Deckbox();

rotate(180,[0,0,1])rotate(180,[0,1,0])translate([0,wall*4,-commandh-wall])
		
    Lid();

    





 
